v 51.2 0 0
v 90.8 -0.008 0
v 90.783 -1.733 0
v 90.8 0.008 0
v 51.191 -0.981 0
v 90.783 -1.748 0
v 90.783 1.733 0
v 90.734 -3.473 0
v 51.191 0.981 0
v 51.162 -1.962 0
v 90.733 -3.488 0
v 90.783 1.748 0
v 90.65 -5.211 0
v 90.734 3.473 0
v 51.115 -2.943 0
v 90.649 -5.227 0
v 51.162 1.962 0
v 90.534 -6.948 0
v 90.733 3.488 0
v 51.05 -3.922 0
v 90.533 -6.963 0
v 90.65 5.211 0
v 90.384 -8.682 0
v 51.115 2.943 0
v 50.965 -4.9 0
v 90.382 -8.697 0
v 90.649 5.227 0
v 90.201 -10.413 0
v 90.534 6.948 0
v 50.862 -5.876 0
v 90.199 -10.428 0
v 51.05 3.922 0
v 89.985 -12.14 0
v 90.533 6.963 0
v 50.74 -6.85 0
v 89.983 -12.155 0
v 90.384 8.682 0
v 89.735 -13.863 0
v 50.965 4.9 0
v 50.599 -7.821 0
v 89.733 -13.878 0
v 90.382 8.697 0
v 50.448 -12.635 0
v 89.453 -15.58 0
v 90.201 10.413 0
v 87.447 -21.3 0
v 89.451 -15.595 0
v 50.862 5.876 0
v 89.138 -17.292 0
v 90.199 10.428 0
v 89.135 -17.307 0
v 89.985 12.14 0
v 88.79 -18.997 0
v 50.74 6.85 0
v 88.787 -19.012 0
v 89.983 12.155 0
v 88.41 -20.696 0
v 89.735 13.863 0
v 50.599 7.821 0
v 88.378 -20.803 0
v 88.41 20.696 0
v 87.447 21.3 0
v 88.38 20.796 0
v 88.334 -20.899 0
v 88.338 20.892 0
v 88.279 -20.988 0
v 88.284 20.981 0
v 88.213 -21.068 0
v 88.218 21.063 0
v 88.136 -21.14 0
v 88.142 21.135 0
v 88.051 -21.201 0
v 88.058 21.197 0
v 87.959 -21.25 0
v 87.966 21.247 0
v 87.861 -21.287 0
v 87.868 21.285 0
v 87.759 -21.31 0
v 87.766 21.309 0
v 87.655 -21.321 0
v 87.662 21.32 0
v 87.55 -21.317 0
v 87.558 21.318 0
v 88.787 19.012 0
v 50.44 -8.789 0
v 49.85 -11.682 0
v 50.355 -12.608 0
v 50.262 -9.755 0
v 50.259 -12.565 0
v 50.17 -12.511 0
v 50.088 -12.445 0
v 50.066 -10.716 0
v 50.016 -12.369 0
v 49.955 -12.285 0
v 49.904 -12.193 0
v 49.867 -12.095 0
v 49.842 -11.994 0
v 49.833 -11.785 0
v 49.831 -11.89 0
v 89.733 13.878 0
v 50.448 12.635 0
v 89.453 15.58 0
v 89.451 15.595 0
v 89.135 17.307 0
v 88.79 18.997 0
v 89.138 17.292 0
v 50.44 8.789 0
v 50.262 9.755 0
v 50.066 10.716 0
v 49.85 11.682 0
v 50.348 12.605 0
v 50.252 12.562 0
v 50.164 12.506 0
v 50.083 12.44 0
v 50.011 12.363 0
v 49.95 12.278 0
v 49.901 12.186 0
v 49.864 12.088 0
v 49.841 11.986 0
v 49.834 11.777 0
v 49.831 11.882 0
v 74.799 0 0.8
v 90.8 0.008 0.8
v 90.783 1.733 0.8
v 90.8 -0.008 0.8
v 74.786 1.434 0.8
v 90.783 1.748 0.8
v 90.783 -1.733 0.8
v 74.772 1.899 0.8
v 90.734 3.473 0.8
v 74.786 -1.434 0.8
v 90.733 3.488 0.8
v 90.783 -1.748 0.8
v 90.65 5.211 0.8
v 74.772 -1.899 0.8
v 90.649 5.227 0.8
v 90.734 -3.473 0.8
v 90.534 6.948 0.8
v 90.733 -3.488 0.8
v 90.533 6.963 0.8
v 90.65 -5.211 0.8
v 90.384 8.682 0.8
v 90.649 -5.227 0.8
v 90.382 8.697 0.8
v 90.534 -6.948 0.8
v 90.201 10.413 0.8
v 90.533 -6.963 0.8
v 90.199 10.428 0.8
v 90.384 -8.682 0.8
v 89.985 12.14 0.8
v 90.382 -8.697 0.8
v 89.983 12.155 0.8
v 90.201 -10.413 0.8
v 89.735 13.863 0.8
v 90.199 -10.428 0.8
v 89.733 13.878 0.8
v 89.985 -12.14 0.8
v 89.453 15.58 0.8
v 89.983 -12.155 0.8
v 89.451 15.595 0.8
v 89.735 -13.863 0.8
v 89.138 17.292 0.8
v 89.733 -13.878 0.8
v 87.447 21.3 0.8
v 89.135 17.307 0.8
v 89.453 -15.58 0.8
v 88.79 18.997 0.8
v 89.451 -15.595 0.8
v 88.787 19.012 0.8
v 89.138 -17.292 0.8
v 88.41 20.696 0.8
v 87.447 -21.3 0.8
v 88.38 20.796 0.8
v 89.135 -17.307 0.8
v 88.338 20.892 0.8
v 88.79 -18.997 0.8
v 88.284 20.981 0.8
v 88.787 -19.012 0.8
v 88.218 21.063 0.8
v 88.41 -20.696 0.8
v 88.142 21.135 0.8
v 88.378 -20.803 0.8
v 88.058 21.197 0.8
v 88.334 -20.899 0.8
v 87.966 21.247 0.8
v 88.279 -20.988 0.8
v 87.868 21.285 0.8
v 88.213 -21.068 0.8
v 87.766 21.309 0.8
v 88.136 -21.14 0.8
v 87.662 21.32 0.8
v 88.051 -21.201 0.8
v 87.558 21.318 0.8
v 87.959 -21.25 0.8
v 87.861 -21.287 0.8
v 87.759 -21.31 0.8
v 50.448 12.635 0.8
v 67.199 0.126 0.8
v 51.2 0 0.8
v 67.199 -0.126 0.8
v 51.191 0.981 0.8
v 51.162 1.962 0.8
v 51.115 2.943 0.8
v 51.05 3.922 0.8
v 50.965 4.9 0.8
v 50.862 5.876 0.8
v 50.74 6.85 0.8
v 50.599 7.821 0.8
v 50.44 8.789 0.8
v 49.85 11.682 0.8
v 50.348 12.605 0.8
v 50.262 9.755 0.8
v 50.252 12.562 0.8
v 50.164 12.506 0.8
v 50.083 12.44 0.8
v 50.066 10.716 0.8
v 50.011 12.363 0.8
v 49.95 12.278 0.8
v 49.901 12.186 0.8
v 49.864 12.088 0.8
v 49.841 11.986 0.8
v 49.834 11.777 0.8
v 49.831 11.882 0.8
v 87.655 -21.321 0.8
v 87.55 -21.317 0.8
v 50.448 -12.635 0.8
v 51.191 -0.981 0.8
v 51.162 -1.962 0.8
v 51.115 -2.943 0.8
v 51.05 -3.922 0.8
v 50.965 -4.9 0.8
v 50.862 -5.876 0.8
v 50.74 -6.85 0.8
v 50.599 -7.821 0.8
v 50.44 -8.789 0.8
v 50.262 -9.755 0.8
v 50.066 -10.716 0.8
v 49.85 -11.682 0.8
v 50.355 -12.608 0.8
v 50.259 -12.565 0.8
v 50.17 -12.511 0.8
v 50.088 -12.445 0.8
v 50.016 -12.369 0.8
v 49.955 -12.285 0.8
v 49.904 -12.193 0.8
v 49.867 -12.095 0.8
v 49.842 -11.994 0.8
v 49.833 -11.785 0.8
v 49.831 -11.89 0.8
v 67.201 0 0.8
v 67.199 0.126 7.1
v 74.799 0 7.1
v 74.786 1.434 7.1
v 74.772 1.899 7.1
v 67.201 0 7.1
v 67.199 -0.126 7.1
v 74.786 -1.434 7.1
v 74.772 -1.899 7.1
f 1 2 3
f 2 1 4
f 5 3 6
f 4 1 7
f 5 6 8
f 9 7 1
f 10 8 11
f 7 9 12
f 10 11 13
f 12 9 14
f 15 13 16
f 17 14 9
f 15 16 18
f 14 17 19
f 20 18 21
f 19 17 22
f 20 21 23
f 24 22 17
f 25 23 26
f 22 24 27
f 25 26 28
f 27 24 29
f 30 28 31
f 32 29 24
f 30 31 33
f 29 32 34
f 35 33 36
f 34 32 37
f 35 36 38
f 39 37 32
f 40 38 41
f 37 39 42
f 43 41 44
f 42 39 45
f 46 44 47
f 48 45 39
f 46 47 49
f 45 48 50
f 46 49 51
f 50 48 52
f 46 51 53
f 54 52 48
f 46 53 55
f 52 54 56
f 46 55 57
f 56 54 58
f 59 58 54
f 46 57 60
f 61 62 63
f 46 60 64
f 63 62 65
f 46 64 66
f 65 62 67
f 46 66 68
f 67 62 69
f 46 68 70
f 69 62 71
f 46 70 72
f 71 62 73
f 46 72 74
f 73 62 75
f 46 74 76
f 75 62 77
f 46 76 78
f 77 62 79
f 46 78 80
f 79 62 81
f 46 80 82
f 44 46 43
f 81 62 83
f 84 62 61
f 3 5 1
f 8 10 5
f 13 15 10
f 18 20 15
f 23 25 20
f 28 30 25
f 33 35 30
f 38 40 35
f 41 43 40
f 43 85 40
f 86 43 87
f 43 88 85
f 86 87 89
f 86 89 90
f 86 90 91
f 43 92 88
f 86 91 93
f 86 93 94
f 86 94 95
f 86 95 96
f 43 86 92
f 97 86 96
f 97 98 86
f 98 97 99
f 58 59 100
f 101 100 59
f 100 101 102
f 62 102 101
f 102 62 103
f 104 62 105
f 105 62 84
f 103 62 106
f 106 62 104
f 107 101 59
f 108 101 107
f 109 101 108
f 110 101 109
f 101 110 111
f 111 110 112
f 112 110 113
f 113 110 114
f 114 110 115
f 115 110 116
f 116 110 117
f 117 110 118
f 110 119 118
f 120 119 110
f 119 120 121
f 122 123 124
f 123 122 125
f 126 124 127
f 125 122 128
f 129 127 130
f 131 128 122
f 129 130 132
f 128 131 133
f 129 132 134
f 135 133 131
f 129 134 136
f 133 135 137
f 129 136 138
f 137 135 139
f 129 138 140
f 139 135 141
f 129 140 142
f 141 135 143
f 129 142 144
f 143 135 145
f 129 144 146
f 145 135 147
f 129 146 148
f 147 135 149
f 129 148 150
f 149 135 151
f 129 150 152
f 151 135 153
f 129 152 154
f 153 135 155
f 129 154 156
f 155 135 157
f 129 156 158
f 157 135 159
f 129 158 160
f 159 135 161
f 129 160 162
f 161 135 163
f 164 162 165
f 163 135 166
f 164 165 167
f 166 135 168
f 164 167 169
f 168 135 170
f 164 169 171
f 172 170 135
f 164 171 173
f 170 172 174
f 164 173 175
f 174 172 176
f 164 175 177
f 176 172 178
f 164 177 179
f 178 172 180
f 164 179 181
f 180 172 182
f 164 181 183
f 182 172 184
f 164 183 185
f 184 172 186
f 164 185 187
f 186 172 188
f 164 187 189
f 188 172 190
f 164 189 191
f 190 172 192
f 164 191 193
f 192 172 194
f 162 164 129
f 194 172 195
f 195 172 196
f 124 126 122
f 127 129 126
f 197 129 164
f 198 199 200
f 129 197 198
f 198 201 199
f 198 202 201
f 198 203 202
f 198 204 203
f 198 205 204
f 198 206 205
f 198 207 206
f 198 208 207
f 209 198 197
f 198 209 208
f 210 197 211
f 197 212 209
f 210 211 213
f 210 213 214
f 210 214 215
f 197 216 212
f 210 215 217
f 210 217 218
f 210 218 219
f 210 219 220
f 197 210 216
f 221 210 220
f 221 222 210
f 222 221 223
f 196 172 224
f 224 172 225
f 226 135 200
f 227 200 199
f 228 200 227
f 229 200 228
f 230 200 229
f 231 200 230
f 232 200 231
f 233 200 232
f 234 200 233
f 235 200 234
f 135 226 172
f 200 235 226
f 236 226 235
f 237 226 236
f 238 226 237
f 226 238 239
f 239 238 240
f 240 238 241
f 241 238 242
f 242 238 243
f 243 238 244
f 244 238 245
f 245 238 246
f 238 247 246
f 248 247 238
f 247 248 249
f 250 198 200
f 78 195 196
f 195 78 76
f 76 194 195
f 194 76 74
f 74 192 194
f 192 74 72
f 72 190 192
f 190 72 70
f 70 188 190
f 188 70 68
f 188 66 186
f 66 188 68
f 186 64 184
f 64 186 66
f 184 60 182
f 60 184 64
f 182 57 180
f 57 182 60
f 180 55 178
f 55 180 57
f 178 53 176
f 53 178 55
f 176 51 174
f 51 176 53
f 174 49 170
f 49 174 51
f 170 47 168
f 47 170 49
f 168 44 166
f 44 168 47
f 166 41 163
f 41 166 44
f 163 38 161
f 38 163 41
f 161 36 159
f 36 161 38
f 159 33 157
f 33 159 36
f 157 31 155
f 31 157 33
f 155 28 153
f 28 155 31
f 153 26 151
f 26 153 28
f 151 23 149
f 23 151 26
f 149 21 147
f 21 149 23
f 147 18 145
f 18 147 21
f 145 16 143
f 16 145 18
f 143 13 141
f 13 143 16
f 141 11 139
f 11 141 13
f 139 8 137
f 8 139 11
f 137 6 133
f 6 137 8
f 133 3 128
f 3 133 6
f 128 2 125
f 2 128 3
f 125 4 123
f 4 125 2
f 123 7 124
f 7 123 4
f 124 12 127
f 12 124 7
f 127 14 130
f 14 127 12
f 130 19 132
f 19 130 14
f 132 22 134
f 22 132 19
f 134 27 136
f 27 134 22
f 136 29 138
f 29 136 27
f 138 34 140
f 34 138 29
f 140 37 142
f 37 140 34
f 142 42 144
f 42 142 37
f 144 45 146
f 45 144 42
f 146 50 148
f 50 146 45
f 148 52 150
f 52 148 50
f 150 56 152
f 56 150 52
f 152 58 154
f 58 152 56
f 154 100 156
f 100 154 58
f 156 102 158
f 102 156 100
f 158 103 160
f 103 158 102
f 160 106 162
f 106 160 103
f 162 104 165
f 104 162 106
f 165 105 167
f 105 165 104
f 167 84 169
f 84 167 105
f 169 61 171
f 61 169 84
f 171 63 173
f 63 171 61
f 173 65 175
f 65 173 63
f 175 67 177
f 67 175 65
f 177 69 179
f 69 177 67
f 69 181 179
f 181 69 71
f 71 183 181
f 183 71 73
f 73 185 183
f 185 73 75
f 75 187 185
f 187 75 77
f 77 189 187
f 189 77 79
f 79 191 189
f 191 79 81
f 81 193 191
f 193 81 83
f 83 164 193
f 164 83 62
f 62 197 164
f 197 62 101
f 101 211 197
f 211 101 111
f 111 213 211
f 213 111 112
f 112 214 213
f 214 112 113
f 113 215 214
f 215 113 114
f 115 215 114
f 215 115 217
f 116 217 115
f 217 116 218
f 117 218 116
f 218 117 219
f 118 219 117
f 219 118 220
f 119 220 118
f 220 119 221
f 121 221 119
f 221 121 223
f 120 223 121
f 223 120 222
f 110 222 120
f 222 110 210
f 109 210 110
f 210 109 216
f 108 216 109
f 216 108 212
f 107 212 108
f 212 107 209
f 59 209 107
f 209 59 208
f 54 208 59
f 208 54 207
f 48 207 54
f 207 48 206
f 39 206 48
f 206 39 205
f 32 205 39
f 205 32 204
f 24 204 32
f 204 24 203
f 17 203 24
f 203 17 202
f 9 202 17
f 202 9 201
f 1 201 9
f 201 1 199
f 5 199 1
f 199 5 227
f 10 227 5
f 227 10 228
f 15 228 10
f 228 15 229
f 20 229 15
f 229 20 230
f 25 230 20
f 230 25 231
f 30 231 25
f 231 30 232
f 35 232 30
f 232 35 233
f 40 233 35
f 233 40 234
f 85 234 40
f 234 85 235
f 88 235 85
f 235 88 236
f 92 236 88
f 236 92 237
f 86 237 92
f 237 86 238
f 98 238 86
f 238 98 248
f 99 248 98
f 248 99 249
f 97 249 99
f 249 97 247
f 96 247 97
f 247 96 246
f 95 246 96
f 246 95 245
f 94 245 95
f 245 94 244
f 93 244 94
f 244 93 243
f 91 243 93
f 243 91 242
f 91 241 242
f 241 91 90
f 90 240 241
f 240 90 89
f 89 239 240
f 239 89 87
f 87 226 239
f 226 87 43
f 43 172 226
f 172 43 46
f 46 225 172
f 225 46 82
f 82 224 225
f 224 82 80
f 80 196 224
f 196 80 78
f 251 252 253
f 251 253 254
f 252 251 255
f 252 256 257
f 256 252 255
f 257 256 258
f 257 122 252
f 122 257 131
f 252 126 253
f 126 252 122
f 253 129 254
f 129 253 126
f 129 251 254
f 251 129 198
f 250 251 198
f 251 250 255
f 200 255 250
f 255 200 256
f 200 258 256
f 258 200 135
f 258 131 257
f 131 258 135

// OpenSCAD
// file: parameters.scad
// =============================================================================
// Gen-CC — nightly 2026-10-13 (physics_scorer, honest magpylib watts)
// Stator-only upgrade for an existing Gen-BX: the R71 rotors and Ø168 steel stay as they are; a new annular 12-bobbin stator with 6.3 mm copper (magnet gap 9.35 → 8.90 mm) and longer r52–90 bobbins (the open-centre stator now packs one size up) replaces the old one, together with a shorter gap sleeve, frame rods moved out to R93.5 and new bearing bridges. No new magnets or steel.
// Clocking 0 deg (magnets N facing S) + D-flat keyed bore + index notch + flip-symmetric hole map.
// Windable 2-piece bobbin; turns = physics_scorer turns_fit; copper only between flanges.
// Steel back-iron: 2× Ø168 × 4.76 mm (3/16") mild-steel discs (steel_backiron_disc.dxf); magnets sit ON the steel
// (through-pockets) -> score with --back-iron. Night 2026-10-13.
// =============================================================================
topology            = "dual_rotor";

// --- Wire / winding (physics_scorer winding-fit) -------------------------------
wire_awg            = 26;
wire_od             = 0.45;     // insulated OD mm (bare 0.405)
fill_realistic      = 0.65;     // insulated-wire area / window (DENSE layered wind with a jig; scorer cap 0.65)
turns               = 391;       // = physics_scorer turns_fit (do NOT raise)
coil_former_type    = "bobbin";
coil_core_inset     = 15.20;     // radial copper build: hub = copper boundary inset by this
wind_build_axial    = 0.0;      // nothing proud of the flanges
wind_build_radial   = 0.0;

// --- Bobbin (base + lid) ---------------------------------------------------------
coil_id_r           = 52.00;    // copper boundary sector
coil_od_r           = 90.00;
span_deg            = 26.36;    // = pitch - 2*asin((wall+0.85)/coil_id_r) -> >=1.2 mm stator web
former_web          = 6.30;     // copper height between flanges (TALL copper: steel keeps Bz up)
flange_t            = 0.80;     // >= 0.8 mm FDM wall rule (tall winds push on the flanges)
wall                = 0.80;     // flange lip beyond copper
former_bare_h       = former_web + 2 * flange_t;
coil_envelope_h     = former_bare_h + 2 * wind_build_axial;
tab_w               = 7.0;
tab_len             = 7.0;
tab_h               = former_bare_h / 2;
pin_d               = 1.9;      // 1.75 mm filament locating pin
coil_mount_r        = coil_od_r + 0.2 + 4.0;
lead_y              = 1.6;
lead_slot_w         = 0.9;
lead_groove_d       = 0.6;

// --- Gap -------------------------------------------------------------------------
run_clear           = 0.50;     // rotor face -> flange
gap_spacer_h        = run_clear + wind_build_axial;
m2m                 = coil_envelope_h + 2 * run_clear;   // rotor face to rotor face (= gap_sleeve length)

// --- Stator ----------------------------------------------------------------------
coil_stations       = 12;
bay_clear           = 0.25;
stator_thick        = former_bare_h;                        // bobbins flush both faces
stator_od           = 198;
shaft_clear_stator  = 14.0;     // stator is static; gap sleeve OD 12 spins inside
stator_ir           = 46.95;    // ANNULAR stator: open centre (nested one-plate pack); inner rim 4.0 mm

// --- Rotor(s) --------------------------------------------------------------------
magnet_Br           = 1.43;     // N52
magnet_d_large      = 20.0;
magnet_h_large      = 5.0;      // one O20x5 per pocket
magnet_h_small      = 5.0;      // unused: no O5 pockets in this kit
halbach_magnetisation = "none";  // NO O5 assist magnets in this kit (scan: they lower the 4-pole score)
rotor_b_same_axis   = true;     // same-index magnets share one axis: N faces S across the gap
large_pocket_d      = 20.3;
small_pocket_d      = 5.3;
pocket_h            = 5.00;     // THROUGH the carrier: magnet back face sits on the steel disc (FLUSH seat: carrier = magnet height, magnet face level with the rotor face)
large_n             = 8;
R_large             = 71.0;
small_r_list        = [];       // no O5 pockets
carrier_od          = 168.0;
carrier_thick       = pocket_h;
hub_h               = 12.0;     // > steel_t + insert: radial set-screw clears the steel
hub_od              = 24.0;     // slim hub so the M4 brace rods fit at R~18 inside the coil ring
hub_insert_d        = 4.0;      // M3 heat-set insert, radial, bears on the D-flat
rotor_b_offset_deg  = 0.0;      // CLOCKING: magnets directly opposite
shaft_key           = "dflat";
dflat_depth         = 0.5;      // 8 mm shaft with 0.5 mm flat (7.5 across flat)
index_notch_d       = 3.0;

// --- Steel back-iron (buyable laser-cut) -------------------------------------------
steel_t             = 4.76;      // mild steel thickness (image method ignores it; sized from steel_flux.py so the return path stays well below saturation)
steel_center_hole   = 26.0;     // slips over the rotor hub (OD 24)
steel_od            = carrier_od;   // steel disc OD = rotor carrier OD

// --- Modular MAX interface ----------------------------------------------------------
shaft_bore          = 8.35;
dflat_x             = 4.0 - dflat_depth + (shaft_bore - 8.0) / 2;
bearing_d           = 21.85;
bearing_h           = 7.2;
m3_clear            = 3.5;
bolt_r_inner        = 30.0;     // M3 steel-disc clamp bolts (inside the magnet ring)
bolt_n_inner        = 4;
bolt_inner_angles   = [0, 90, 180, 270];
bolt_r_outer        = 44.0;     // second M3 steel-disc clamp ring
bolt_outer_angles   = [67.5, 112.5, 247.5, 292.5];
flange_bolt_r       = 93.5;     // frame rods: OUTSIDE the rotor OD (rotors spin inside them)
flange_bolt_n       = 4;
flange_bolt_offset  = 45.00;    // between coil stations -> never cuts a lead groove/tab
brace_r             = 18.0;
brace_d             = 4.3;      // temporary M4 jack rods (assembly only)
brace_n             = 4;
brace_angles        = [45, 135, 225, 315];          // flip-symmetric

spacer_pad_od       = 14.0;
spacer_pad_id       = m3_clear;
endbell_od          = 197.0;
endbell_thick       = 8.0;
endbell_shaft_clear = 10.0;
collar_h            = 10.0;
standoff_od         = 9.0;
frame_standoff_h    = run_clear + carrier_thick + hub_h + collar_h + 2.0;
sleeve_od           = 12.0;
plate_max_mm        = 410;

$fn = 64;
// main file
// Gen-CC — bobbin BASE (bottom flange + hub). Print x12, flange down. Wind 26 AWG x 391 t around
// the hub with the LID glued on (coil_lid.stl). Copper lives ONLY between the flanges (no proud winds).
include <parameters.scad>;
$fn = 48;
module sector_2d(r_in, r_out, ang) {
    polygon([
        for (a = [-ang/2 : ang/24 : ang/2]) [r_in*cos(a), r_in*sin(a)],
        for (a = [ang/2 : -ang/24 : -ang/2]) [r_out*cos(a), r_out*sin(a)]
    ]);
}
module footprint_2d() { offset(r=wall) sector_2d(coil_id_r, coil_od_r, span_deg); }
module hub_2d()       { offset(delta=-coil_core_inset) sector_2d(coil_id_r, coil_od_r, span_deg); }

union() {
    linear_extrude(flange_t) footprint_2d();
    translate([0, 0, flange_t - 0.01]) linear_extrude(former_web + 0.01) hub_2d();
}
